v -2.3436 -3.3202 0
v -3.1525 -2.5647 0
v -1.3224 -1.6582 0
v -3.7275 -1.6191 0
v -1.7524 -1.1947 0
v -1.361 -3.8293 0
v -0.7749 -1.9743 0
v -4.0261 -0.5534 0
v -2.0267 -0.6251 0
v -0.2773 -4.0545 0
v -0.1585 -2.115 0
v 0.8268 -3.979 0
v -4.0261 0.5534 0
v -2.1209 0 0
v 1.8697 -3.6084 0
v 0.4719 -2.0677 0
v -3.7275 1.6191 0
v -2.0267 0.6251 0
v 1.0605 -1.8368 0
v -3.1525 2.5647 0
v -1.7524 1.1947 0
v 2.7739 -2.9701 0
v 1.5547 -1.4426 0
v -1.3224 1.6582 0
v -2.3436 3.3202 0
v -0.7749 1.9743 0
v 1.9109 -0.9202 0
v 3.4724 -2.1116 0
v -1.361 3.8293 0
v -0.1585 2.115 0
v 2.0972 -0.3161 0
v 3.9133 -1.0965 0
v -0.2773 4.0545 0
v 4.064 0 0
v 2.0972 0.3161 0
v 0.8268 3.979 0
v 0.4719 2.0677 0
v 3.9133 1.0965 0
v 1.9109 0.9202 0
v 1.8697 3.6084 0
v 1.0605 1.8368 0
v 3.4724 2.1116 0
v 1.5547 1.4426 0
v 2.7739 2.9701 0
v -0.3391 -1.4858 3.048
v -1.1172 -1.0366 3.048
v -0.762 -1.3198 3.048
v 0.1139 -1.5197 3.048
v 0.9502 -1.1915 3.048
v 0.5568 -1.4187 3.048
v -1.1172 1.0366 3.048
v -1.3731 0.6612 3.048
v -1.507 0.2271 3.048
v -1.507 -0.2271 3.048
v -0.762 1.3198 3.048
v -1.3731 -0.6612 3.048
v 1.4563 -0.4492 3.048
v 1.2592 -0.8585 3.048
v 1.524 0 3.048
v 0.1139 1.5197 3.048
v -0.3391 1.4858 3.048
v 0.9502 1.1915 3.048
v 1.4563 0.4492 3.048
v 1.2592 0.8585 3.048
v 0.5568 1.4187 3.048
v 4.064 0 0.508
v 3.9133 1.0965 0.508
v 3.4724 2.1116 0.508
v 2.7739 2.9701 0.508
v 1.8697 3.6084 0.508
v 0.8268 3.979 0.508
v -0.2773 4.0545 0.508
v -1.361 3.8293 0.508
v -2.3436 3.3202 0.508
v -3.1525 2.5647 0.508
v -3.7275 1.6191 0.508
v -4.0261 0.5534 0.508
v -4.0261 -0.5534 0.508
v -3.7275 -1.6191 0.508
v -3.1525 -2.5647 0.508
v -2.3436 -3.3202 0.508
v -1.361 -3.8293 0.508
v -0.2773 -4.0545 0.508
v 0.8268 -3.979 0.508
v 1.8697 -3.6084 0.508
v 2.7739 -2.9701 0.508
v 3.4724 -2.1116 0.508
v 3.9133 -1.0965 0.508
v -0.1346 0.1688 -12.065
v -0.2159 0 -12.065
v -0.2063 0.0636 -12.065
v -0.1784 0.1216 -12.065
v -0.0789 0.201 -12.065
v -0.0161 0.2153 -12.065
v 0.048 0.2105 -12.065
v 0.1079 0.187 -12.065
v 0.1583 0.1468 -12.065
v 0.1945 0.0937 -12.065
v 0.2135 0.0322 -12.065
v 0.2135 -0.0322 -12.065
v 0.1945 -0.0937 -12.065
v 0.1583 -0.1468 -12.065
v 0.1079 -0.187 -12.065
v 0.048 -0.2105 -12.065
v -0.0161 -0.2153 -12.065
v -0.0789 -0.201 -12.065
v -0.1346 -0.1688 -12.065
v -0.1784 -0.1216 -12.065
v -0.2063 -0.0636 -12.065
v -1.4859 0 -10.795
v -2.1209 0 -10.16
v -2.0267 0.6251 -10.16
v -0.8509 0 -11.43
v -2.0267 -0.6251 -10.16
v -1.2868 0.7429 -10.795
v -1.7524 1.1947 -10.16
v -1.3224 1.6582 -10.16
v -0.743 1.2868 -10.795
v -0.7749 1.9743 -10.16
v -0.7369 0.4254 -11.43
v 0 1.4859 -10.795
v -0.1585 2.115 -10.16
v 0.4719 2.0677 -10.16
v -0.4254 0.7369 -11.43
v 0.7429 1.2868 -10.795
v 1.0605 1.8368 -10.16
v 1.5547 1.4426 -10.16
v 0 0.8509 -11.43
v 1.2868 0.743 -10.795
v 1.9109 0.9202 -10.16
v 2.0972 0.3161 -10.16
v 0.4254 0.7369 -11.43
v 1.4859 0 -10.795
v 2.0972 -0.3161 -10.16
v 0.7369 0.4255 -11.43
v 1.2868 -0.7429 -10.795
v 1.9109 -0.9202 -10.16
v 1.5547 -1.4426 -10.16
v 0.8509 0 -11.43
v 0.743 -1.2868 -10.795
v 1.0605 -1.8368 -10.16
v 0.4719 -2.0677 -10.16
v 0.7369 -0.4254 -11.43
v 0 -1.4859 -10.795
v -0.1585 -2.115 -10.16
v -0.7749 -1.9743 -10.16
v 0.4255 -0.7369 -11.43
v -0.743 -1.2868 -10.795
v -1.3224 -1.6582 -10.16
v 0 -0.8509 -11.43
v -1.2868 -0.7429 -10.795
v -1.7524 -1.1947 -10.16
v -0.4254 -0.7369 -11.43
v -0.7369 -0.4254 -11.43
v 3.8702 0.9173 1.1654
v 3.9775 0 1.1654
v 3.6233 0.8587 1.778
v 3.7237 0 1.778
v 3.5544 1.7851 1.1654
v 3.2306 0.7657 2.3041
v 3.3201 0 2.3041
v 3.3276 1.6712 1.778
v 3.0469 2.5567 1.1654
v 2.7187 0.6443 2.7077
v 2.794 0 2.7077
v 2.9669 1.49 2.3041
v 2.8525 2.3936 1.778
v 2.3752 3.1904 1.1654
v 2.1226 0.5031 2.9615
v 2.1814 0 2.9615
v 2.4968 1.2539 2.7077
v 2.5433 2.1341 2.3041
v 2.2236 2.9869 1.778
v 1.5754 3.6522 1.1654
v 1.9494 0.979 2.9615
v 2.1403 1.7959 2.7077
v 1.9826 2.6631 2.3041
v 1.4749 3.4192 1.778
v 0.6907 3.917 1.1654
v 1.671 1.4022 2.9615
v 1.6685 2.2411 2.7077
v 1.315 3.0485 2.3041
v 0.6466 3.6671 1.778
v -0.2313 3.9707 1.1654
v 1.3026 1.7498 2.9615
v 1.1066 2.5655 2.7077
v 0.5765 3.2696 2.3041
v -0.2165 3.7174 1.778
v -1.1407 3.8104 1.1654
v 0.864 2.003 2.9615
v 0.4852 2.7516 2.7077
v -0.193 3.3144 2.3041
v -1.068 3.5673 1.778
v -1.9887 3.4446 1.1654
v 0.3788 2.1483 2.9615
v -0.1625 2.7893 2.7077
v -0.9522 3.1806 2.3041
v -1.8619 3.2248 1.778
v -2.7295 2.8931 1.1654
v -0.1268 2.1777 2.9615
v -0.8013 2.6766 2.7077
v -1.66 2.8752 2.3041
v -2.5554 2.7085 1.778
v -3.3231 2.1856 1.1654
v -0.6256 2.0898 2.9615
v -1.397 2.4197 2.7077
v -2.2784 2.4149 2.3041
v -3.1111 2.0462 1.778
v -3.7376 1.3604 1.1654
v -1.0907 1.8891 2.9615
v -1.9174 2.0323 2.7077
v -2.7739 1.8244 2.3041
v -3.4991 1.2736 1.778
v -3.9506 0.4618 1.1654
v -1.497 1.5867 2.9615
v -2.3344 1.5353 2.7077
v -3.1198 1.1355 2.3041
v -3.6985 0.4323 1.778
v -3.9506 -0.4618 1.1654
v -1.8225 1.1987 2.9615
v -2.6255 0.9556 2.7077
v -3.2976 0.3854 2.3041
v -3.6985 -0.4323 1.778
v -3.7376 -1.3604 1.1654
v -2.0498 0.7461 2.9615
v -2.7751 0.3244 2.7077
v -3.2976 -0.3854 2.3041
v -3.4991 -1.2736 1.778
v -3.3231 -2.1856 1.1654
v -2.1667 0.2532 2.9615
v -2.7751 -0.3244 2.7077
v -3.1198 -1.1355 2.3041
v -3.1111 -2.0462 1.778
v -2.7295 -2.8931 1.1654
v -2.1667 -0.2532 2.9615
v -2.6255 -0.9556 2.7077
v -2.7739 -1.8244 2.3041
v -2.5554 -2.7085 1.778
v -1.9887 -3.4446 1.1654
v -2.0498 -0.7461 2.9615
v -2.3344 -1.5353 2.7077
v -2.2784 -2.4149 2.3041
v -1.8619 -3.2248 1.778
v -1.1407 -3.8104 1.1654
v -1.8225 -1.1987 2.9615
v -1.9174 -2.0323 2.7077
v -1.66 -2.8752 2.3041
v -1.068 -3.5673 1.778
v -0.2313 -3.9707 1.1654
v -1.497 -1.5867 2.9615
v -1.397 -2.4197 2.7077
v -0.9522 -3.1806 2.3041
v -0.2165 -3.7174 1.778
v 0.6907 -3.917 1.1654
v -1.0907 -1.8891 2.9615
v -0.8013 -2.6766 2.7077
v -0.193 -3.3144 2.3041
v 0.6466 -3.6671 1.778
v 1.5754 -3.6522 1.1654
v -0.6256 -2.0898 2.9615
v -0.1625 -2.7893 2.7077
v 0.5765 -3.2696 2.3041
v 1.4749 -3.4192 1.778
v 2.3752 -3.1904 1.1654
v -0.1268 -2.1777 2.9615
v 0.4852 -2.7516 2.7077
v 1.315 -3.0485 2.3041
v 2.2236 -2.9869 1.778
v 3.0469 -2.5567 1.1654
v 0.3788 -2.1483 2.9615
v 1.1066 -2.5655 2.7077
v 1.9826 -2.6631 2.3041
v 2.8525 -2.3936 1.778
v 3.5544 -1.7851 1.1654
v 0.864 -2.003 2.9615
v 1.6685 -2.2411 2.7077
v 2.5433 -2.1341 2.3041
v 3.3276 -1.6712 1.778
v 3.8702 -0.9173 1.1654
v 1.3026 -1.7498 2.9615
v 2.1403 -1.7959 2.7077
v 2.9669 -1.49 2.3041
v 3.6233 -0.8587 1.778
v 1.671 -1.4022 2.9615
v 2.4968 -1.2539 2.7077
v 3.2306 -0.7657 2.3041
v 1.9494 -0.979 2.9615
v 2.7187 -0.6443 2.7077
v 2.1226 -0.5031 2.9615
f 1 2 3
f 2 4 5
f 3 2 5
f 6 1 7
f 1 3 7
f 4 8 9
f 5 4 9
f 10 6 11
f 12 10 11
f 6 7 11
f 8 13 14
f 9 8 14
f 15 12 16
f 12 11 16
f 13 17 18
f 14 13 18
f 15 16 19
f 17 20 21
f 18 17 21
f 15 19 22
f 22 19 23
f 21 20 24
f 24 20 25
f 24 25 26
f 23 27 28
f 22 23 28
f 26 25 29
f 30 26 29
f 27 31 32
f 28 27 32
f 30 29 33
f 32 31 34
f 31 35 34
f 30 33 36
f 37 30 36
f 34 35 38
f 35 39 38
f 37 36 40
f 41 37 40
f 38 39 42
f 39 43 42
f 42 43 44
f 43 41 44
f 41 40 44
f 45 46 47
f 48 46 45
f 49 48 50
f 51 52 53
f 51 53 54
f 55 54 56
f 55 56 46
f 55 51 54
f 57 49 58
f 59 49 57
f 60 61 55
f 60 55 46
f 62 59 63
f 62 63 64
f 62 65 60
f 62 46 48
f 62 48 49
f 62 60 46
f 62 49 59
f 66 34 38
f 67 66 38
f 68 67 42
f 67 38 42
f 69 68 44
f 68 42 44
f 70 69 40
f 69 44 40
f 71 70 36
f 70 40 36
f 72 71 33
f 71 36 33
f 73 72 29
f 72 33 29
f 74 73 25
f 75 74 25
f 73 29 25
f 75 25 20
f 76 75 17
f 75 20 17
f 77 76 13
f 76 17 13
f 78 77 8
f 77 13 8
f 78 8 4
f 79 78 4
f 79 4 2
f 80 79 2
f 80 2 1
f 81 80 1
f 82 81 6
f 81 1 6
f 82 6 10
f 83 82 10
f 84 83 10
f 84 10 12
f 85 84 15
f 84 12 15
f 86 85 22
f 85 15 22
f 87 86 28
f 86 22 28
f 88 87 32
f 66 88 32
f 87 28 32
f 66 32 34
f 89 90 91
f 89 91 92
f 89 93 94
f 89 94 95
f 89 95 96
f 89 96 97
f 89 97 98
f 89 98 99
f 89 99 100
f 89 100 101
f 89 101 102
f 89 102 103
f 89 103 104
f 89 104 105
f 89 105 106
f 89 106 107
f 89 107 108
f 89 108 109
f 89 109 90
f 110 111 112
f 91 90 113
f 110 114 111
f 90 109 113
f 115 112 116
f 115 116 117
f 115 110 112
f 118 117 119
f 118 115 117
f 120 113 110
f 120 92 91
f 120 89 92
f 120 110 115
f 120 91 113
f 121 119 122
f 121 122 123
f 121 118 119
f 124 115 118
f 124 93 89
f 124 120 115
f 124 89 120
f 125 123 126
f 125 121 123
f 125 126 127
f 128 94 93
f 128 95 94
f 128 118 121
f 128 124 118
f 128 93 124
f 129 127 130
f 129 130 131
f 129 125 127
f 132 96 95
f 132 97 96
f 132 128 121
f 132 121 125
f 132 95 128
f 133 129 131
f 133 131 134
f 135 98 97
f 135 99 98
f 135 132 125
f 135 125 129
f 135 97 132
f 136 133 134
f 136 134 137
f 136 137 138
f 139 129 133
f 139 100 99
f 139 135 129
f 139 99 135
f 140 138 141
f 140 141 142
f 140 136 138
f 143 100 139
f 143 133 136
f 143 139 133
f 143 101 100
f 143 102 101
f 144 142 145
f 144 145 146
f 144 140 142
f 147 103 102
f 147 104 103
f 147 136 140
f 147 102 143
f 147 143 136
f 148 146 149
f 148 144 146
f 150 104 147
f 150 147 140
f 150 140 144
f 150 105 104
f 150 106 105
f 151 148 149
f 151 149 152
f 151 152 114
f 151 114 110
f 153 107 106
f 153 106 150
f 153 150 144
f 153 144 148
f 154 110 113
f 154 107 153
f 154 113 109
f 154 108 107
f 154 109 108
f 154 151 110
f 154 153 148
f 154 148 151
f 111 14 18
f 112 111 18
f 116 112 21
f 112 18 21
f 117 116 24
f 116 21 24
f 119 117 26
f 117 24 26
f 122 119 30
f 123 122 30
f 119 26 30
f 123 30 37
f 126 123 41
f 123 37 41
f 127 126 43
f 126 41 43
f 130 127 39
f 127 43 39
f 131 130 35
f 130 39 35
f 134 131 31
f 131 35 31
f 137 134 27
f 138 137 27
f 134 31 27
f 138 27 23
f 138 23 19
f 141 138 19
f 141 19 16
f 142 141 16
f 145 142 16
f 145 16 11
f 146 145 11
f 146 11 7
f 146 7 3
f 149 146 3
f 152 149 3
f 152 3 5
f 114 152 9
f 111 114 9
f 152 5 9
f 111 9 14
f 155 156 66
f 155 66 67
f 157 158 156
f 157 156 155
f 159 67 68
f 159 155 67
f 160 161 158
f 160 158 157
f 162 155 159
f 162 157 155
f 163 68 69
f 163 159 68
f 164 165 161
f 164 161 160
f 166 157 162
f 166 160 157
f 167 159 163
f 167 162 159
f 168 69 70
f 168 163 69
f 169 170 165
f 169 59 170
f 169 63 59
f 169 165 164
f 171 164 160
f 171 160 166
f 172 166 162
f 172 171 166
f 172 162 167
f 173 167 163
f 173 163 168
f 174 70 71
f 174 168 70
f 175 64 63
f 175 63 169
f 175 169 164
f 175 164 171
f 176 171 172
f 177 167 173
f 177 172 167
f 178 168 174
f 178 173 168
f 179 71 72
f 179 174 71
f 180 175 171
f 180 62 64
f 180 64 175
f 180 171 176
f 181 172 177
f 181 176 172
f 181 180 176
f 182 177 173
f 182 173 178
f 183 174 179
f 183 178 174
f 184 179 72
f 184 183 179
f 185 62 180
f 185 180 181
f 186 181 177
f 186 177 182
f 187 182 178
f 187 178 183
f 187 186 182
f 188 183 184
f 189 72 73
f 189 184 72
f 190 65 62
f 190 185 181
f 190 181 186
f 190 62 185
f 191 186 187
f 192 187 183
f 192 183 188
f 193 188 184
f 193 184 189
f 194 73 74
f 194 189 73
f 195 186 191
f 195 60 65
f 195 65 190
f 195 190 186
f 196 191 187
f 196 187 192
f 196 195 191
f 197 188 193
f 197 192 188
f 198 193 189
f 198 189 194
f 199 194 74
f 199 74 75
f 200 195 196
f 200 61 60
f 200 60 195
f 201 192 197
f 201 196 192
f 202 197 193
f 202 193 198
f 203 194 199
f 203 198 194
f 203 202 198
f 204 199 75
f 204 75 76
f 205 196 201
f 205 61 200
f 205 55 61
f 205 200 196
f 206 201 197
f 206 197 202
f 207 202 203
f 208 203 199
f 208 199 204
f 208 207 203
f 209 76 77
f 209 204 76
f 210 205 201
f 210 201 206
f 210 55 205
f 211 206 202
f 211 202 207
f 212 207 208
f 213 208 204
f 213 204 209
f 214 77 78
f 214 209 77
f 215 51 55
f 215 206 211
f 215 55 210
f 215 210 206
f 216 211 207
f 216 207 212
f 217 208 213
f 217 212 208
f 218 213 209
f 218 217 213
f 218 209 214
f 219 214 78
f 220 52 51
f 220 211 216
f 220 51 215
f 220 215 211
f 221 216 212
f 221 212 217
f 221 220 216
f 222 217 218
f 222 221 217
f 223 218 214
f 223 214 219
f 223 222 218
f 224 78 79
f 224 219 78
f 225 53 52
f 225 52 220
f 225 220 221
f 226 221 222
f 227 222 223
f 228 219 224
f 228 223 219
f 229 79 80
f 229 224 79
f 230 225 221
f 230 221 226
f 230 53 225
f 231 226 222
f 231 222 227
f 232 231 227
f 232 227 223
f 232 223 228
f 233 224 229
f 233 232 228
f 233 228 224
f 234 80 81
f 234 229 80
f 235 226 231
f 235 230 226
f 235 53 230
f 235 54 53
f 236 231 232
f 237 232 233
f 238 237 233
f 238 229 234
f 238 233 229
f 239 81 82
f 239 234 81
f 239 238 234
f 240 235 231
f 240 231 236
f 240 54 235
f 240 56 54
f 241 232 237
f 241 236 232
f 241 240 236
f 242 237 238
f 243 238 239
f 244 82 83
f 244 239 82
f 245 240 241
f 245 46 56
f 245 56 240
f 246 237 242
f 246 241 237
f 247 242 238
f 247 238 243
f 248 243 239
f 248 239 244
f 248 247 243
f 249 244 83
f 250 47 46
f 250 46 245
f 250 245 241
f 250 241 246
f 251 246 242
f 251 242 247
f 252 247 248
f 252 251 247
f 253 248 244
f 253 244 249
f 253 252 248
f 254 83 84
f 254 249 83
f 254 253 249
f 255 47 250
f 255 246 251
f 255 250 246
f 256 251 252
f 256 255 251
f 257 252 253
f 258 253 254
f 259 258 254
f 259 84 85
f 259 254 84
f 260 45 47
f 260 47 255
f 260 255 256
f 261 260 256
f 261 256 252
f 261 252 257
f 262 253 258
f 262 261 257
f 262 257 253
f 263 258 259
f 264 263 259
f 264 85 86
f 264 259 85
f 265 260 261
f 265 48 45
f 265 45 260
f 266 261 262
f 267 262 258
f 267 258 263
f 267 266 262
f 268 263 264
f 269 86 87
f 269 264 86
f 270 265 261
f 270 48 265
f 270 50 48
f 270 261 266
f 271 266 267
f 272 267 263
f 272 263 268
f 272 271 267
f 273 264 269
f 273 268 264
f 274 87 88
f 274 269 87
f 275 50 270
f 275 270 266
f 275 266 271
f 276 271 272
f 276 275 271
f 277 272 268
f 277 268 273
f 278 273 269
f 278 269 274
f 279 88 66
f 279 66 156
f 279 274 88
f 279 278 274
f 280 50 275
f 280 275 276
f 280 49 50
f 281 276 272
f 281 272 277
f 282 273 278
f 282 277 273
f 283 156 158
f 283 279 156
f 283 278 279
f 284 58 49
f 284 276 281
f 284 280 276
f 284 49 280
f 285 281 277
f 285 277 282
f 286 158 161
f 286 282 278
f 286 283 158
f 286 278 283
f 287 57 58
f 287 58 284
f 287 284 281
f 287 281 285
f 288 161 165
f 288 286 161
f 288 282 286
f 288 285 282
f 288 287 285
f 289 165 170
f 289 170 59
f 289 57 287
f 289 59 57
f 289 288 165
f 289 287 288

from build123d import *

# Parameters (mm, degrees)
SKETCH1_R           = 4.064
BOSS_EXTRUDE1_DEPTH = 3.048
SKETCH2_R           = 2.1209
BOSS_EXTRUDE2_DEPTH = 12.065
CHAMFER1_SIZE       = 1.905
FILLET1_R           = 2.54


with BuildPart() as part:
    # Sketch1 → Boss-Extrude1 (new body)
    with BuildSketch(Plane.XY):
        Circle(SKETCH1_R)
    extrude(amount=BOSS_EXTRUDE1_DEPTH)

    # Sketch2 → Boss-Extrude2 (add)
    with BuildSketch(Plane(origin=(0, 0, 0), x_dir=(-1, 0, 0), z_dir=(0, 0, -1))):
        Circle(SKETCH2_R)
    extrude(amount=BOSS_EXTRUDE2_DEPTH)

    # Chamfer1
    chamfer1_edges = [part.edges().sort_by_distance(p)[0] for p in [
        (2.1209, 0, -12.065),
    ]]
    chamfer(chamfer1_edges, length=CHAMFER1_SIZE)

    # Fillet1
    fillet1_edges = [part.edges().sort_by_distance(p)[0] for p in [
        (-4.064, 0, 3.048),
    ]]
    fillet(fillet1_edges, radius=FILLET1_R)


solid = part.part
